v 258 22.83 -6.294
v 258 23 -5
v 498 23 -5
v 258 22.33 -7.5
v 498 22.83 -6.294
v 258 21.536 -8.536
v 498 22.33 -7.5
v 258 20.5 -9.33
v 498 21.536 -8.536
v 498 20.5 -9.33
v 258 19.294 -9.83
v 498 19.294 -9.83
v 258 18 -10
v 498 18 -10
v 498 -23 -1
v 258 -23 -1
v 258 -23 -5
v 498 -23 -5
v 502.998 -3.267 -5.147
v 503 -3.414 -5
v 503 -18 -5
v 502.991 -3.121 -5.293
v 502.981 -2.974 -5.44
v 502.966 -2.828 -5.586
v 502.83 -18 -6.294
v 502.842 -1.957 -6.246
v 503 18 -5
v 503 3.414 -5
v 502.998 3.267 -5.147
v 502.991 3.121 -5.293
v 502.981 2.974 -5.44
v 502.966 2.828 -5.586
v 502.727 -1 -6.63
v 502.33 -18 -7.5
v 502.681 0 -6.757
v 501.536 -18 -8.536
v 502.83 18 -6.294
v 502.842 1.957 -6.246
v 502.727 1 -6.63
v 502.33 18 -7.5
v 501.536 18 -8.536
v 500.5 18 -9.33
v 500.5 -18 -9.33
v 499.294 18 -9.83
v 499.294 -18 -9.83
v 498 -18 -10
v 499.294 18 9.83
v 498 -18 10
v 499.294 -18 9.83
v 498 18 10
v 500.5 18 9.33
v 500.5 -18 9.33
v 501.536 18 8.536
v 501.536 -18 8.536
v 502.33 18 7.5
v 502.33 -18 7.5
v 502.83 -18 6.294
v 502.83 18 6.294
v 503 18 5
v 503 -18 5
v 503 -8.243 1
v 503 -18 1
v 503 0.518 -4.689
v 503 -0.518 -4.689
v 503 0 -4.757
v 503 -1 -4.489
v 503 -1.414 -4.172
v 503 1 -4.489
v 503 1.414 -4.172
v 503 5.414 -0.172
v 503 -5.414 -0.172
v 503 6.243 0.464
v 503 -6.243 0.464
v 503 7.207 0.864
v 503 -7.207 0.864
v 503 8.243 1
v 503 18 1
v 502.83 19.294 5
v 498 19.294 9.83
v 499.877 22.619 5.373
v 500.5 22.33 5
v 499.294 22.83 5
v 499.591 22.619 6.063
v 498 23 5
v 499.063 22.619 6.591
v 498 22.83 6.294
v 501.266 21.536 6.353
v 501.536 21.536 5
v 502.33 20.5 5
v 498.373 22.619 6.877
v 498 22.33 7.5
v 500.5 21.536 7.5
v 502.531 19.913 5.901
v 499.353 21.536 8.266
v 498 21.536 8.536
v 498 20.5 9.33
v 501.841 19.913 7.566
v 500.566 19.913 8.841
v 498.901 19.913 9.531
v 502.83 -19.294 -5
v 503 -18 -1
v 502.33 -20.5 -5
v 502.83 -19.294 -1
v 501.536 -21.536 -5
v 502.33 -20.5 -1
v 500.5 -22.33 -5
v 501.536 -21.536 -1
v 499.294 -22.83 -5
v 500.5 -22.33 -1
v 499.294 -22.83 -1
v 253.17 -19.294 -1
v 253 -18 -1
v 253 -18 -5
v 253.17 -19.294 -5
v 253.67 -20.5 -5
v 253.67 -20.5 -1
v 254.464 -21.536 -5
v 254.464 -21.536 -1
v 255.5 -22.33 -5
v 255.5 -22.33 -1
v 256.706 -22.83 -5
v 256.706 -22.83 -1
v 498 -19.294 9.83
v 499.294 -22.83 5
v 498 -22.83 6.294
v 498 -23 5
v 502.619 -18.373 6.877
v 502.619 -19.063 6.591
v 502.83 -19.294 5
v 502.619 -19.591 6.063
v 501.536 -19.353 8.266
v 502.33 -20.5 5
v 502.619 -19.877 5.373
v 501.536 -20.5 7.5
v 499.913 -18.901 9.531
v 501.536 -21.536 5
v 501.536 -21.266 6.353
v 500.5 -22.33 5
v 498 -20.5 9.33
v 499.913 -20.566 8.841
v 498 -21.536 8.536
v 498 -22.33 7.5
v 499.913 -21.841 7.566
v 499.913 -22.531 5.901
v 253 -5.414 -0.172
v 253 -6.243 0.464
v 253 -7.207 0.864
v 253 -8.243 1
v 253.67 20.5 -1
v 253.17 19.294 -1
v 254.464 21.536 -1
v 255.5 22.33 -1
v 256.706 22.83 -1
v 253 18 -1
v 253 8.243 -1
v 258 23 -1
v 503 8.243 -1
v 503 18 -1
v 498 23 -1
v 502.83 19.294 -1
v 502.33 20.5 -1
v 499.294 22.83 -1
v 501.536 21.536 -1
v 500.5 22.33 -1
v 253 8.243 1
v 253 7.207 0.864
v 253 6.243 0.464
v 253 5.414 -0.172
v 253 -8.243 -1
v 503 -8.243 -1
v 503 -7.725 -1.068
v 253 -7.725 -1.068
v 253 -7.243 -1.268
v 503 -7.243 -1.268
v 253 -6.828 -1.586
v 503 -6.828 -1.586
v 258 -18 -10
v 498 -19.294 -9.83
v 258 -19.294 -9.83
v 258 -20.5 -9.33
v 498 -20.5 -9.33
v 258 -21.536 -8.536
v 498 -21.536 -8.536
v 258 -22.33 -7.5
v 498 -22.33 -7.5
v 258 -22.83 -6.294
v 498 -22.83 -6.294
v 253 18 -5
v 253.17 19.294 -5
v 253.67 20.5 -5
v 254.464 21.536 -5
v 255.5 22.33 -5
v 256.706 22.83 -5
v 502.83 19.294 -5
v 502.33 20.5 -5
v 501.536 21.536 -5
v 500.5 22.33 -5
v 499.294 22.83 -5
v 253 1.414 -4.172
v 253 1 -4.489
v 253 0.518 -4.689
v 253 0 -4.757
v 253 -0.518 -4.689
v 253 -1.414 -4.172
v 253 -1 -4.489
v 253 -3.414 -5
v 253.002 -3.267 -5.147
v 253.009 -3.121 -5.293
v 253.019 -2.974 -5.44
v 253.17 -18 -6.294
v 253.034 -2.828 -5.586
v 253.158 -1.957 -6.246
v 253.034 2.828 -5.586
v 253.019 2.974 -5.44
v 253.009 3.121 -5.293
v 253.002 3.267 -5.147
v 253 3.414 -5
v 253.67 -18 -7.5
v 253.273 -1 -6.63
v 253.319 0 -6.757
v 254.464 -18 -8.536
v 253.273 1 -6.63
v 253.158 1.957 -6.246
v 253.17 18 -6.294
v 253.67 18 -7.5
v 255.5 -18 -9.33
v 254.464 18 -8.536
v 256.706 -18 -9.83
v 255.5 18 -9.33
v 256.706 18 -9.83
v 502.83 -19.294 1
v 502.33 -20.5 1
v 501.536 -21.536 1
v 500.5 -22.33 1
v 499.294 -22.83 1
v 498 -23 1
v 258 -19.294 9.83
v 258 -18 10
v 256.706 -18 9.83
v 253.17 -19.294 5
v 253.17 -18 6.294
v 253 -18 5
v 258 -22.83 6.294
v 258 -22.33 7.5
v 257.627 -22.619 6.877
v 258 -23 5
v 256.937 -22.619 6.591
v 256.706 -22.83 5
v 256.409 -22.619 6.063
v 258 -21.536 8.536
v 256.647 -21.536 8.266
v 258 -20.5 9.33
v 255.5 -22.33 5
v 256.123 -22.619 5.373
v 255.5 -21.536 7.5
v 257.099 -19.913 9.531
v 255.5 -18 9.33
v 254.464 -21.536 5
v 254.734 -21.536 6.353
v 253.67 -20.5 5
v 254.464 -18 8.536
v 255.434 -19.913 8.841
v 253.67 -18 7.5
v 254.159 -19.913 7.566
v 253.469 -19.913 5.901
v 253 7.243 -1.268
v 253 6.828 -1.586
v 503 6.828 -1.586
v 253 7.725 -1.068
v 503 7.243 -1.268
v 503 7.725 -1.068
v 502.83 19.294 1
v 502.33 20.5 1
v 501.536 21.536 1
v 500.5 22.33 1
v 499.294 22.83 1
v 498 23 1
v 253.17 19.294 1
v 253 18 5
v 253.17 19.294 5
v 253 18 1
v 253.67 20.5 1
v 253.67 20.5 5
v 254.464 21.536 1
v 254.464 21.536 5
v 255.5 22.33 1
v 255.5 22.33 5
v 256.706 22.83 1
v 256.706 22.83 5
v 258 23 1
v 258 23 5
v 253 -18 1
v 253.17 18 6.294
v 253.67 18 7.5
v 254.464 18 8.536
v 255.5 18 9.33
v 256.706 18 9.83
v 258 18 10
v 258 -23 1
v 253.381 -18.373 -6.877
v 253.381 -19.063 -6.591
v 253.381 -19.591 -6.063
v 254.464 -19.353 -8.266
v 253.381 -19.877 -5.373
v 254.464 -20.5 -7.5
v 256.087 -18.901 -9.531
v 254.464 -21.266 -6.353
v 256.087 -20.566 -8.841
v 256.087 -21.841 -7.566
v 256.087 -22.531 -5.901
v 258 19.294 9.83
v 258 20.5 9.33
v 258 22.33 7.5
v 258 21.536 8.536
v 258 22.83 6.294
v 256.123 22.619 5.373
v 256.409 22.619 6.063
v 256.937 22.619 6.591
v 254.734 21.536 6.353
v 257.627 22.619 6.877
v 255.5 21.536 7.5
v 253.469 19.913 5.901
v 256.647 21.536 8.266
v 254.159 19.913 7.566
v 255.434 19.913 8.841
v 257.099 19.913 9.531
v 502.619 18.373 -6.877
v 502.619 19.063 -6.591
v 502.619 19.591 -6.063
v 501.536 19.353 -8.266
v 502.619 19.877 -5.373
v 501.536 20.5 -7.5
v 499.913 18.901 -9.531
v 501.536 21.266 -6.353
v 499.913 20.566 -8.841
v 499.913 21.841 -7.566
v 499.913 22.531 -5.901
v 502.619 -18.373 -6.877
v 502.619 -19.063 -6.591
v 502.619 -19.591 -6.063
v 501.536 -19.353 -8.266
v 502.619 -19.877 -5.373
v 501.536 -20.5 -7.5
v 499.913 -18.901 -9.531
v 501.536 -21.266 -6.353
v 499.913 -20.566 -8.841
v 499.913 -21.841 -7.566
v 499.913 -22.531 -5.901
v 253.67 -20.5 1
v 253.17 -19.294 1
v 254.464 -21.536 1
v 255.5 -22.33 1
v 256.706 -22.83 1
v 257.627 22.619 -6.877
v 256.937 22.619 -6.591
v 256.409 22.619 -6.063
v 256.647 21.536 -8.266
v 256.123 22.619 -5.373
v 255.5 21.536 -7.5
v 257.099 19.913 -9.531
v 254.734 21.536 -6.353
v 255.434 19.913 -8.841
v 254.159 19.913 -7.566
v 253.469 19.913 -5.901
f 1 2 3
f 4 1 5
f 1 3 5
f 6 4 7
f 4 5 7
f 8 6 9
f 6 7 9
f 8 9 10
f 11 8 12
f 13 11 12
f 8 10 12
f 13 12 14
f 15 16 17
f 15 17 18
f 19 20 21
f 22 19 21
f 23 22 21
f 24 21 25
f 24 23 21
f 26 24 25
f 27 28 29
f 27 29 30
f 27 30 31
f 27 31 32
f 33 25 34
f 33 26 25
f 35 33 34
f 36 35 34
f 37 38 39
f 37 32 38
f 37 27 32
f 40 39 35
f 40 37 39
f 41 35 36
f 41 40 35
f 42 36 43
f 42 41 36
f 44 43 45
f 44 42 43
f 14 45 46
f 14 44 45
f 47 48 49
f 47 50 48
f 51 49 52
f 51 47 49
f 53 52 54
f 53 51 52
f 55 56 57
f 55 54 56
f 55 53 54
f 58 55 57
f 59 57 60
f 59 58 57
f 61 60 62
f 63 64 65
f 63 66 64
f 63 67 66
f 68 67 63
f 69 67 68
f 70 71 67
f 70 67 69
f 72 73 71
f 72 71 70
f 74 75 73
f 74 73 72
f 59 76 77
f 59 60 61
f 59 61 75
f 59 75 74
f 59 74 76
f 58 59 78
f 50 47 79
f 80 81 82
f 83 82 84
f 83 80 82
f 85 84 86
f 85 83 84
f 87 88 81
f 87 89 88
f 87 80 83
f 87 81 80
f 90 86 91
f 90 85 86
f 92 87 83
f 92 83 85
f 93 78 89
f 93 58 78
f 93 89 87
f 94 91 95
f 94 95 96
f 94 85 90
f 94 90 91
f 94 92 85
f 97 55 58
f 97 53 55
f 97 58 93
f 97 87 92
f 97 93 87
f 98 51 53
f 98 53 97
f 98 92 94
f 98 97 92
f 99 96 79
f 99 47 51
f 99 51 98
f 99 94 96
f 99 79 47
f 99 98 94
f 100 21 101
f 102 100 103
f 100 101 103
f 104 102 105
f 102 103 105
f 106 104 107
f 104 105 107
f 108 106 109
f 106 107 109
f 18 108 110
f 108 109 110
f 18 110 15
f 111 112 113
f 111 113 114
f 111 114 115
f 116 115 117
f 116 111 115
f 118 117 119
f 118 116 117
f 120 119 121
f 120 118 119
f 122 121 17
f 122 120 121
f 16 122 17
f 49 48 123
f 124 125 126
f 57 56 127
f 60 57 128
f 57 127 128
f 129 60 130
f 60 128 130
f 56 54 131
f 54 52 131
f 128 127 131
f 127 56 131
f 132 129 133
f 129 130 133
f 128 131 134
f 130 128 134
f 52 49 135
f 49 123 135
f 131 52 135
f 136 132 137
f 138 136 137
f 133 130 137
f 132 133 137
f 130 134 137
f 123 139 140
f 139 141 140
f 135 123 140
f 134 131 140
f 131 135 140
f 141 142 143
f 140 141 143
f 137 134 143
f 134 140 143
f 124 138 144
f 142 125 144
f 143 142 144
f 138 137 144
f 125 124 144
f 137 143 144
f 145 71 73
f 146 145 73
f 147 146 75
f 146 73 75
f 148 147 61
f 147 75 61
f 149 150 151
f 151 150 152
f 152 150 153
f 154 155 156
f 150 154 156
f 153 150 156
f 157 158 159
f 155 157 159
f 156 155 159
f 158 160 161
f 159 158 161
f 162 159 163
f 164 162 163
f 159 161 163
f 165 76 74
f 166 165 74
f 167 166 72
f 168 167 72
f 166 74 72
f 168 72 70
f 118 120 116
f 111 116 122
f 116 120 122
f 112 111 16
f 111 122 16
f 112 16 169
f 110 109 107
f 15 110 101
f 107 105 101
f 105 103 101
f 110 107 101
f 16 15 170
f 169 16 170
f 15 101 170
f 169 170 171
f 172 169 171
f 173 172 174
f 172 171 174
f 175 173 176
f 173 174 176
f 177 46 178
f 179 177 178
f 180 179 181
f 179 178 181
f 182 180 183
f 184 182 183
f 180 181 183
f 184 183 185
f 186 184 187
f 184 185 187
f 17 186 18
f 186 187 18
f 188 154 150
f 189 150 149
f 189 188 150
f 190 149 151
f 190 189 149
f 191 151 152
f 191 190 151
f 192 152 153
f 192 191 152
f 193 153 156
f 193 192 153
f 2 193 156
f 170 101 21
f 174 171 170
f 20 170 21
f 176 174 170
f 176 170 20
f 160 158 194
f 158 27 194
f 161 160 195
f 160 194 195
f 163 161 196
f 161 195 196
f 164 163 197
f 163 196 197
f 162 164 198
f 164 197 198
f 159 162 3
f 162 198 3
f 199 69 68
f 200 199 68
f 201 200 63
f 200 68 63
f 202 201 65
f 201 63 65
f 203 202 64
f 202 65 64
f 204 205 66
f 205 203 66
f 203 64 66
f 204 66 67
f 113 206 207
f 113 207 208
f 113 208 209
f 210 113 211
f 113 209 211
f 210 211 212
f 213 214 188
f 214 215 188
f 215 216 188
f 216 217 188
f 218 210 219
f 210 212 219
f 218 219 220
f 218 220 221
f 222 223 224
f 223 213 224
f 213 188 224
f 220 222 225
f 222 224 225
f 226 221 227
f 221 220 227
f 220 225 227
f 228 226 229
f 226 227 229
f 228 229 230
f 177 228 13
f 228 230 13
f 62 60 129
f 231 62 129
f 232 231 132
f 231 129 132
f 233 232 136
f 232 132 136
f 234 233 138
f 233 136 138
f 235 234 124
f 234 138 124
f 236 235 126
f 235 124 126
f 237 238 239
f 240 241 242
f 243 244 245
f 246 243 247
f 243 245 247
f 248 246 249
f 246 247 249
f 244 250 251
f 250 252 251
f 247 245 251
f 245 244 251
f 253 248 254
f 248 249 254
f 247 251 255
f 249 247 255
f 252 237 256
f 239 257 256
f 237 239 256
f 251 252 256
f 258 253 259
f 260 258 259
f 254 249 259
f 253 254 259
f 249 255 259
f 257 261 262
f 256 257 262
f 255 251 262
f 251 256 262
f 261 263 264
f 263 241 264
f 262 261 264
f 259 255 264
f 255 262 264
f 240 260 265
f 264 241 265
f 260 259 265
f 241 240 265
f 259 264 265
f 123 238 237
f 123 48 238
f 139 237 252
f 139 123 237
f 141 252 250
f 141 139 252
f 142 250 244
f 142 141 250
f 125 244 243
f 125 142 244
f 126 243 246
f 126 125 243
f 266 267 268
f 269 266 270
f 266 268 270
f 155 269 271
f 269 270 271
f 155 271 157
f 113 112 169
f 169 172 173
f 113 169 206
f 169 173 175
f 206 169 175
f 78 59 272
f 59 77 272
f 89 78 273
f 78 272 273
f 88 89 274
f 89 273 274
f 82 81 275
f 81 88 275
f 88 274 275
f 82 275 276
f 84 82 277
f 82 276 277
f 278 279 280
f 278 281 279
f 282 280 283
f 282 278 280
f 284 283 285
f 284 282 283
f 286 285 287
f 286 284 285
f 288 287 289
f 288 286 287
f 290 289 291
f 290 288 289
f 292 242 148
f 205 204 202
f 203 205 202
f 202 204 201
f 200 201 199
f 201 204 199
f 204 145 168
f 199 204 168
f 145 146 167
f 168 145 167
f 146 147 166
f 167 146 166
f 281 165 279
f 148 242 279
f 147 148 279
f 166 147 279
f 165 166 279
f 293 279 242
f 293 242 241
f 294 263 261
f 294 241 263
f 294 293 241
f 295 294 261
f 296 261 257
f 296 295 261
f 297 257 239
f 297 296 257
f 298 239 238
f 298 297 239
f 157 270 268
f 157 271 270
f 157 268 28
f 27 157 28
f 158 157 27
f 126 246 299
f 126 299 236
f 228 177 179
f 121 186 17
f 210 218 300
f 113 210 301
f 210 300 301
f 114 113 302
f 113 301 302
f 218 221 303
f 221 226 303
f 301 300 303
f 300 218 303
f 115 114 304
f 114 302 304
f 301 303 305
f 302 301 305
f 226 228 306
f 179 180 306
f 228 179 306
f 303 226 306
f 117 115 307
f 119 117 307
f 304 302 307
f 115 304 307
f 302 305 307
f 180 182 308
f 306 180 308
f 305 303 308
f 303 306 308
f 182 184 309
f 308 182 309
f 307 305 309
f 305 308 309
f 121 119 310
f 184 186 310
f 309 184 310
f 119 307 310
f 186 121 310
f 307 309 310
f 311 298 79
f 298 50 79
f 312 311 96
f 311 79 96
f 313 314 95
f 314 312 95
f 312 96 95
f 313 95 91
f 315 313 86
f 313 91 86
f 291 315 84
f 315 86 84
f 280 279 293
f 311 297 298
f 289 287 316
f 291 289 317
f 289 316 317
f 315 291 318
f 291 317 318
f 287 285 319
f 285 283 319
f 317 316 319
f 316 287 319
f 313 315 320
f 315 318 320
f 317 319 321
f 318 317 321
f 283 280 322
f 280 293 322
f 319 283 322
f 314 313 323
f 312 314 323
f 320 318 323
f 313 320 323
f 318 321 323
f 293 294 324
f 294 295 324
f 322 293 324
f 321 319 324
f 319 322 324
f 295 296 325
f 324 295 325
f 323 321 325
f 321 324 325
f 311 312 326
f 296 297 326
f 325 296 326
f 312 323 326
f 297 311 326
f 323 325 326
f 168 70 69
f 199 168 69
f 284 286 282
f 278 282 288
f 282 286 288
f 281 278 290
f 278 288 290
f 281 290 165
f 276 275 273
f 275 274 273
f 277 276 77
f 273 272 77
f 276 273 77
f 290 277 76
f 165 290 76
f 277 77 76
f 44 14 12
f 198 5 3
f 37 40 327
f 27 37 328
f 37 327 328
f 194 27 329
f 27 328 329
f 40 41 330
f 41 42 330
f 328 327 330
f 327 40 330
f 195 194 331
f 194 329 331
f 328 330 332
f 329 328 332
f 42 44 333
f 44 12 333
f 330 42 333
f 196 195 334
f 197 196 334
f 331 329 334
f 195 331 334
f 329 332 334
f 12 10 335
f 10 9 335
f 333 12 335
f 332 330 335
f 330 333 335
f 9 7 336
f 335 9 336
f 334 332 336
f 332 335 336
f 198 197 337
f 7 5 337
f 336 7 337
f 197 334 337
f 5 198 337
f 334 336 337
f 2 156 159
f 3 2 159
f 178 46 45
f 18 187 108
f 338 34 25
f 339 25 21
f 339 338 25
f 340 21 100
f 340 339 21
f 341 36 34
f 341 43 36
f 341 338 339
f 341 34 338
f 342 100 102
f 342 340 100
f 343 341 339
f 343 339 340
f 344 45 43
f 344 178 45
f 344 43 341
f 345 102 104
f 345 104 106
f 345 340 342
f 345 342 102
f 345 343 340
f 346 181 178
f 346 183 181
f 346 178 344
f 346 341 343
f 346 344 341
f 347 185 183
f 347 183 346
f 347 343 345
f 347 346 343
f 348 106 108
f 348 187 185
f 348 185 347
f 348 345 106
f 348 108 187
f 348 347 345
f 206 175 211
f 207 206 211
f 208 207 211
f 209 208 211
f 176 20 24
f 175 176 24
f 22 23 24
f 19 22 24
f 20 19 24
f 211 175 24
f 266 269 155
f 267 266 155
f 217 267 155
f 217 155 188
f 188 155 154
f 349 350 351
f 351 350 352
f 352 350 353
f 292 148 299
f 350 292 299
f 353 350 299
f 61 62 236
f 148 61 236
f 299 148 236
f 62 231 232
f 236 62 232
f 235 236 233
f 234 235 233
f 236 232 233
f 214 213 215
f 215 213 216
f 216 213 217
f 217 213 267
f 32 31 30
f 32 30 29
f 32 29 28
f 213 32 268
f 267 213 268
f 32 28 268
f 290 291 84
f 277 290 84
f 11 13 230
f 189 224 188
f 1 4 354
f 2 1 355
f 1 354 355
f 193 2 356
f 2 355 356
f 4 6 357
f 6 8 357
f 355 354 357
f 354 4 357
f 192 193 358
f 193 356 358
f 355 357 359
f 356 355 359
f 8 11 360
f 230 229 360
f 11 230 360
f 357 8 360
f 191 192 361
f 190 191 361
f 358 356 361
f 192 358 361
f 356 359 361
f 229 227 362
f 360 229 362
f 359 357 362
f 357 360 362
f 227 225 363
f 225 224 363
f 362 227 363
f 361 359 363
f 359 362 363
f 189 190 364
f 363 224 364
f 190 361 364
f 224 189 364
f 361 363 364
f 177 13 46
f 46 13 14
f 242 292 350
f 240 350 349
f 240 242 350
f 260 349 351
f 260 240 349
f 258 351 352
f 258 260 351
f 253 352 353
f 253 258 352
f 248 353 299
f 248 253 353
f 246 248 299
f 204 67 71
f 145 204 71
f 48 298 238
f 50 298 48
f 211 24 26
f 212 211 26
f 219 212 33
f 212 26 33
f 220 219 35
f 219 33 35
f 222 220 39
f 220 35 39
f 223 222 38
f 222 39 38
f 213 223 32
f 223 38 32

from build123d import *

# Parameters (mm, degrees)
SKETCH_1_W          = 250
SKETCH_1_H          = 46
EXTRUDE_1_DEPTH     = 10
FILLET_1_R          = 5
CUT_EXTRUDE_1_DEPTH = 252.254850699


with BuildPart() as part:
    # Sketch 1 → Extrude 1 (new, symmetric)
    with BuildSketch(Plane.XY):
        with Locations((378, 0)):
            Rectangle(SKETCH_1_W, SKETCH_1_H)
    extrude(amount=EXTRUDE_1_DEPTH, both=True)

    # Fillet 1
    fillet_1_edges = [part.edges().sort_by_distance(p)[0] for p in [
        (253, 0, 10),
        (378, -23, 10),
        (503, 0, 10),
        (378, -23, -10),
        (253, 0, -10),
        (378, 23, -10),
        (503, 0, -10),
        (503, -23, 0),
        (253, -23, 0),
        (253, 23, 0),
        (503, 23, 0),
        (378, 23, 10),
    ]]
    fillet(fillet_1_edges, radius=FILLET_1_R)

    # Sketch 3 → Cut-Extrude 1 (cut, through all)
    with BuildSketch(Plane(origin=(503, 0, 0), x_dir=(0, 0, -1), z_dir=(1, 0, 0))):
        with BuildLine():
            Line((1.585786438, -6.828427125), (5.585786438, -2.828427125))
            ThreePointArc((5.585786438, -2.828427125), (6.757359313, 0), (5.585786438, 2.828427125))
            Line((5.585786438, 2.828427125), (1.585786438, 6.828427125))
            ThreePointArc((1.585786438, 6.828427125), (1.152240935, 7.477273822), (1, 8.242640687))
            Line((1, 8.242640687), (1, 49.262457351))
            Line((1, 49.262457351), (-1, 49.262457351))
            Line((-1, 49.262457351), (-1, 8.242640687))
            ThreePointArc((-1, 8.242640687), (-0.69551813, 6.711906958), (0.171572875, 5.414213562))
            Line((0.171572875, 5.414213562), (4.171572875, 1.414213562))
            ThreePointArc((4.171572875, 1.414213562), (4.757359313, 0), (4.171572875, -1.414213562))
            Line((4.171572875, -1.414213562), (0.171572875, -5.414213562))
            ThreePointArc((0.171572875, -5.414213562), (-0.69551813, -6.711906958), (-1, -8.242640687))
            Line((-1, -8.242640687), (-1, -42.794712141))
            Line((-1, -42.794712141), (1, -42.794712141))
            Line((1, -42.794712141), (1, -8.242640687))
            ThreePointArc((1, -8.242640687), (1.152240935, -7.477273822), (1.585786438, -6.828427125))
        make_face()
    extrude(amount=-CUT_EXTRUDE_1_DEPTH, mode=Mode.SUBTRACT)


with BuildPart() as cut_extrude_1_piece_1:
    # of the separate pieces the step leaves, piece 1, a body of its own (cut_extrude_1_pieces)
    add(part.part.solids().sort_by_distance((258, -23, 5))[0])


with BuildPart() as cut_extrude_1_piece_2:
    # of the separate pieces the step leaves, piece 2, a body of its own (cut_extrude_1_pieces)
    add(part.part.solids().sort_by_distance((258, -23, -1))[0])


solid = Compound([cut_extrude_1_piece_1.part, cut_extrude_1_piece_2.part])
